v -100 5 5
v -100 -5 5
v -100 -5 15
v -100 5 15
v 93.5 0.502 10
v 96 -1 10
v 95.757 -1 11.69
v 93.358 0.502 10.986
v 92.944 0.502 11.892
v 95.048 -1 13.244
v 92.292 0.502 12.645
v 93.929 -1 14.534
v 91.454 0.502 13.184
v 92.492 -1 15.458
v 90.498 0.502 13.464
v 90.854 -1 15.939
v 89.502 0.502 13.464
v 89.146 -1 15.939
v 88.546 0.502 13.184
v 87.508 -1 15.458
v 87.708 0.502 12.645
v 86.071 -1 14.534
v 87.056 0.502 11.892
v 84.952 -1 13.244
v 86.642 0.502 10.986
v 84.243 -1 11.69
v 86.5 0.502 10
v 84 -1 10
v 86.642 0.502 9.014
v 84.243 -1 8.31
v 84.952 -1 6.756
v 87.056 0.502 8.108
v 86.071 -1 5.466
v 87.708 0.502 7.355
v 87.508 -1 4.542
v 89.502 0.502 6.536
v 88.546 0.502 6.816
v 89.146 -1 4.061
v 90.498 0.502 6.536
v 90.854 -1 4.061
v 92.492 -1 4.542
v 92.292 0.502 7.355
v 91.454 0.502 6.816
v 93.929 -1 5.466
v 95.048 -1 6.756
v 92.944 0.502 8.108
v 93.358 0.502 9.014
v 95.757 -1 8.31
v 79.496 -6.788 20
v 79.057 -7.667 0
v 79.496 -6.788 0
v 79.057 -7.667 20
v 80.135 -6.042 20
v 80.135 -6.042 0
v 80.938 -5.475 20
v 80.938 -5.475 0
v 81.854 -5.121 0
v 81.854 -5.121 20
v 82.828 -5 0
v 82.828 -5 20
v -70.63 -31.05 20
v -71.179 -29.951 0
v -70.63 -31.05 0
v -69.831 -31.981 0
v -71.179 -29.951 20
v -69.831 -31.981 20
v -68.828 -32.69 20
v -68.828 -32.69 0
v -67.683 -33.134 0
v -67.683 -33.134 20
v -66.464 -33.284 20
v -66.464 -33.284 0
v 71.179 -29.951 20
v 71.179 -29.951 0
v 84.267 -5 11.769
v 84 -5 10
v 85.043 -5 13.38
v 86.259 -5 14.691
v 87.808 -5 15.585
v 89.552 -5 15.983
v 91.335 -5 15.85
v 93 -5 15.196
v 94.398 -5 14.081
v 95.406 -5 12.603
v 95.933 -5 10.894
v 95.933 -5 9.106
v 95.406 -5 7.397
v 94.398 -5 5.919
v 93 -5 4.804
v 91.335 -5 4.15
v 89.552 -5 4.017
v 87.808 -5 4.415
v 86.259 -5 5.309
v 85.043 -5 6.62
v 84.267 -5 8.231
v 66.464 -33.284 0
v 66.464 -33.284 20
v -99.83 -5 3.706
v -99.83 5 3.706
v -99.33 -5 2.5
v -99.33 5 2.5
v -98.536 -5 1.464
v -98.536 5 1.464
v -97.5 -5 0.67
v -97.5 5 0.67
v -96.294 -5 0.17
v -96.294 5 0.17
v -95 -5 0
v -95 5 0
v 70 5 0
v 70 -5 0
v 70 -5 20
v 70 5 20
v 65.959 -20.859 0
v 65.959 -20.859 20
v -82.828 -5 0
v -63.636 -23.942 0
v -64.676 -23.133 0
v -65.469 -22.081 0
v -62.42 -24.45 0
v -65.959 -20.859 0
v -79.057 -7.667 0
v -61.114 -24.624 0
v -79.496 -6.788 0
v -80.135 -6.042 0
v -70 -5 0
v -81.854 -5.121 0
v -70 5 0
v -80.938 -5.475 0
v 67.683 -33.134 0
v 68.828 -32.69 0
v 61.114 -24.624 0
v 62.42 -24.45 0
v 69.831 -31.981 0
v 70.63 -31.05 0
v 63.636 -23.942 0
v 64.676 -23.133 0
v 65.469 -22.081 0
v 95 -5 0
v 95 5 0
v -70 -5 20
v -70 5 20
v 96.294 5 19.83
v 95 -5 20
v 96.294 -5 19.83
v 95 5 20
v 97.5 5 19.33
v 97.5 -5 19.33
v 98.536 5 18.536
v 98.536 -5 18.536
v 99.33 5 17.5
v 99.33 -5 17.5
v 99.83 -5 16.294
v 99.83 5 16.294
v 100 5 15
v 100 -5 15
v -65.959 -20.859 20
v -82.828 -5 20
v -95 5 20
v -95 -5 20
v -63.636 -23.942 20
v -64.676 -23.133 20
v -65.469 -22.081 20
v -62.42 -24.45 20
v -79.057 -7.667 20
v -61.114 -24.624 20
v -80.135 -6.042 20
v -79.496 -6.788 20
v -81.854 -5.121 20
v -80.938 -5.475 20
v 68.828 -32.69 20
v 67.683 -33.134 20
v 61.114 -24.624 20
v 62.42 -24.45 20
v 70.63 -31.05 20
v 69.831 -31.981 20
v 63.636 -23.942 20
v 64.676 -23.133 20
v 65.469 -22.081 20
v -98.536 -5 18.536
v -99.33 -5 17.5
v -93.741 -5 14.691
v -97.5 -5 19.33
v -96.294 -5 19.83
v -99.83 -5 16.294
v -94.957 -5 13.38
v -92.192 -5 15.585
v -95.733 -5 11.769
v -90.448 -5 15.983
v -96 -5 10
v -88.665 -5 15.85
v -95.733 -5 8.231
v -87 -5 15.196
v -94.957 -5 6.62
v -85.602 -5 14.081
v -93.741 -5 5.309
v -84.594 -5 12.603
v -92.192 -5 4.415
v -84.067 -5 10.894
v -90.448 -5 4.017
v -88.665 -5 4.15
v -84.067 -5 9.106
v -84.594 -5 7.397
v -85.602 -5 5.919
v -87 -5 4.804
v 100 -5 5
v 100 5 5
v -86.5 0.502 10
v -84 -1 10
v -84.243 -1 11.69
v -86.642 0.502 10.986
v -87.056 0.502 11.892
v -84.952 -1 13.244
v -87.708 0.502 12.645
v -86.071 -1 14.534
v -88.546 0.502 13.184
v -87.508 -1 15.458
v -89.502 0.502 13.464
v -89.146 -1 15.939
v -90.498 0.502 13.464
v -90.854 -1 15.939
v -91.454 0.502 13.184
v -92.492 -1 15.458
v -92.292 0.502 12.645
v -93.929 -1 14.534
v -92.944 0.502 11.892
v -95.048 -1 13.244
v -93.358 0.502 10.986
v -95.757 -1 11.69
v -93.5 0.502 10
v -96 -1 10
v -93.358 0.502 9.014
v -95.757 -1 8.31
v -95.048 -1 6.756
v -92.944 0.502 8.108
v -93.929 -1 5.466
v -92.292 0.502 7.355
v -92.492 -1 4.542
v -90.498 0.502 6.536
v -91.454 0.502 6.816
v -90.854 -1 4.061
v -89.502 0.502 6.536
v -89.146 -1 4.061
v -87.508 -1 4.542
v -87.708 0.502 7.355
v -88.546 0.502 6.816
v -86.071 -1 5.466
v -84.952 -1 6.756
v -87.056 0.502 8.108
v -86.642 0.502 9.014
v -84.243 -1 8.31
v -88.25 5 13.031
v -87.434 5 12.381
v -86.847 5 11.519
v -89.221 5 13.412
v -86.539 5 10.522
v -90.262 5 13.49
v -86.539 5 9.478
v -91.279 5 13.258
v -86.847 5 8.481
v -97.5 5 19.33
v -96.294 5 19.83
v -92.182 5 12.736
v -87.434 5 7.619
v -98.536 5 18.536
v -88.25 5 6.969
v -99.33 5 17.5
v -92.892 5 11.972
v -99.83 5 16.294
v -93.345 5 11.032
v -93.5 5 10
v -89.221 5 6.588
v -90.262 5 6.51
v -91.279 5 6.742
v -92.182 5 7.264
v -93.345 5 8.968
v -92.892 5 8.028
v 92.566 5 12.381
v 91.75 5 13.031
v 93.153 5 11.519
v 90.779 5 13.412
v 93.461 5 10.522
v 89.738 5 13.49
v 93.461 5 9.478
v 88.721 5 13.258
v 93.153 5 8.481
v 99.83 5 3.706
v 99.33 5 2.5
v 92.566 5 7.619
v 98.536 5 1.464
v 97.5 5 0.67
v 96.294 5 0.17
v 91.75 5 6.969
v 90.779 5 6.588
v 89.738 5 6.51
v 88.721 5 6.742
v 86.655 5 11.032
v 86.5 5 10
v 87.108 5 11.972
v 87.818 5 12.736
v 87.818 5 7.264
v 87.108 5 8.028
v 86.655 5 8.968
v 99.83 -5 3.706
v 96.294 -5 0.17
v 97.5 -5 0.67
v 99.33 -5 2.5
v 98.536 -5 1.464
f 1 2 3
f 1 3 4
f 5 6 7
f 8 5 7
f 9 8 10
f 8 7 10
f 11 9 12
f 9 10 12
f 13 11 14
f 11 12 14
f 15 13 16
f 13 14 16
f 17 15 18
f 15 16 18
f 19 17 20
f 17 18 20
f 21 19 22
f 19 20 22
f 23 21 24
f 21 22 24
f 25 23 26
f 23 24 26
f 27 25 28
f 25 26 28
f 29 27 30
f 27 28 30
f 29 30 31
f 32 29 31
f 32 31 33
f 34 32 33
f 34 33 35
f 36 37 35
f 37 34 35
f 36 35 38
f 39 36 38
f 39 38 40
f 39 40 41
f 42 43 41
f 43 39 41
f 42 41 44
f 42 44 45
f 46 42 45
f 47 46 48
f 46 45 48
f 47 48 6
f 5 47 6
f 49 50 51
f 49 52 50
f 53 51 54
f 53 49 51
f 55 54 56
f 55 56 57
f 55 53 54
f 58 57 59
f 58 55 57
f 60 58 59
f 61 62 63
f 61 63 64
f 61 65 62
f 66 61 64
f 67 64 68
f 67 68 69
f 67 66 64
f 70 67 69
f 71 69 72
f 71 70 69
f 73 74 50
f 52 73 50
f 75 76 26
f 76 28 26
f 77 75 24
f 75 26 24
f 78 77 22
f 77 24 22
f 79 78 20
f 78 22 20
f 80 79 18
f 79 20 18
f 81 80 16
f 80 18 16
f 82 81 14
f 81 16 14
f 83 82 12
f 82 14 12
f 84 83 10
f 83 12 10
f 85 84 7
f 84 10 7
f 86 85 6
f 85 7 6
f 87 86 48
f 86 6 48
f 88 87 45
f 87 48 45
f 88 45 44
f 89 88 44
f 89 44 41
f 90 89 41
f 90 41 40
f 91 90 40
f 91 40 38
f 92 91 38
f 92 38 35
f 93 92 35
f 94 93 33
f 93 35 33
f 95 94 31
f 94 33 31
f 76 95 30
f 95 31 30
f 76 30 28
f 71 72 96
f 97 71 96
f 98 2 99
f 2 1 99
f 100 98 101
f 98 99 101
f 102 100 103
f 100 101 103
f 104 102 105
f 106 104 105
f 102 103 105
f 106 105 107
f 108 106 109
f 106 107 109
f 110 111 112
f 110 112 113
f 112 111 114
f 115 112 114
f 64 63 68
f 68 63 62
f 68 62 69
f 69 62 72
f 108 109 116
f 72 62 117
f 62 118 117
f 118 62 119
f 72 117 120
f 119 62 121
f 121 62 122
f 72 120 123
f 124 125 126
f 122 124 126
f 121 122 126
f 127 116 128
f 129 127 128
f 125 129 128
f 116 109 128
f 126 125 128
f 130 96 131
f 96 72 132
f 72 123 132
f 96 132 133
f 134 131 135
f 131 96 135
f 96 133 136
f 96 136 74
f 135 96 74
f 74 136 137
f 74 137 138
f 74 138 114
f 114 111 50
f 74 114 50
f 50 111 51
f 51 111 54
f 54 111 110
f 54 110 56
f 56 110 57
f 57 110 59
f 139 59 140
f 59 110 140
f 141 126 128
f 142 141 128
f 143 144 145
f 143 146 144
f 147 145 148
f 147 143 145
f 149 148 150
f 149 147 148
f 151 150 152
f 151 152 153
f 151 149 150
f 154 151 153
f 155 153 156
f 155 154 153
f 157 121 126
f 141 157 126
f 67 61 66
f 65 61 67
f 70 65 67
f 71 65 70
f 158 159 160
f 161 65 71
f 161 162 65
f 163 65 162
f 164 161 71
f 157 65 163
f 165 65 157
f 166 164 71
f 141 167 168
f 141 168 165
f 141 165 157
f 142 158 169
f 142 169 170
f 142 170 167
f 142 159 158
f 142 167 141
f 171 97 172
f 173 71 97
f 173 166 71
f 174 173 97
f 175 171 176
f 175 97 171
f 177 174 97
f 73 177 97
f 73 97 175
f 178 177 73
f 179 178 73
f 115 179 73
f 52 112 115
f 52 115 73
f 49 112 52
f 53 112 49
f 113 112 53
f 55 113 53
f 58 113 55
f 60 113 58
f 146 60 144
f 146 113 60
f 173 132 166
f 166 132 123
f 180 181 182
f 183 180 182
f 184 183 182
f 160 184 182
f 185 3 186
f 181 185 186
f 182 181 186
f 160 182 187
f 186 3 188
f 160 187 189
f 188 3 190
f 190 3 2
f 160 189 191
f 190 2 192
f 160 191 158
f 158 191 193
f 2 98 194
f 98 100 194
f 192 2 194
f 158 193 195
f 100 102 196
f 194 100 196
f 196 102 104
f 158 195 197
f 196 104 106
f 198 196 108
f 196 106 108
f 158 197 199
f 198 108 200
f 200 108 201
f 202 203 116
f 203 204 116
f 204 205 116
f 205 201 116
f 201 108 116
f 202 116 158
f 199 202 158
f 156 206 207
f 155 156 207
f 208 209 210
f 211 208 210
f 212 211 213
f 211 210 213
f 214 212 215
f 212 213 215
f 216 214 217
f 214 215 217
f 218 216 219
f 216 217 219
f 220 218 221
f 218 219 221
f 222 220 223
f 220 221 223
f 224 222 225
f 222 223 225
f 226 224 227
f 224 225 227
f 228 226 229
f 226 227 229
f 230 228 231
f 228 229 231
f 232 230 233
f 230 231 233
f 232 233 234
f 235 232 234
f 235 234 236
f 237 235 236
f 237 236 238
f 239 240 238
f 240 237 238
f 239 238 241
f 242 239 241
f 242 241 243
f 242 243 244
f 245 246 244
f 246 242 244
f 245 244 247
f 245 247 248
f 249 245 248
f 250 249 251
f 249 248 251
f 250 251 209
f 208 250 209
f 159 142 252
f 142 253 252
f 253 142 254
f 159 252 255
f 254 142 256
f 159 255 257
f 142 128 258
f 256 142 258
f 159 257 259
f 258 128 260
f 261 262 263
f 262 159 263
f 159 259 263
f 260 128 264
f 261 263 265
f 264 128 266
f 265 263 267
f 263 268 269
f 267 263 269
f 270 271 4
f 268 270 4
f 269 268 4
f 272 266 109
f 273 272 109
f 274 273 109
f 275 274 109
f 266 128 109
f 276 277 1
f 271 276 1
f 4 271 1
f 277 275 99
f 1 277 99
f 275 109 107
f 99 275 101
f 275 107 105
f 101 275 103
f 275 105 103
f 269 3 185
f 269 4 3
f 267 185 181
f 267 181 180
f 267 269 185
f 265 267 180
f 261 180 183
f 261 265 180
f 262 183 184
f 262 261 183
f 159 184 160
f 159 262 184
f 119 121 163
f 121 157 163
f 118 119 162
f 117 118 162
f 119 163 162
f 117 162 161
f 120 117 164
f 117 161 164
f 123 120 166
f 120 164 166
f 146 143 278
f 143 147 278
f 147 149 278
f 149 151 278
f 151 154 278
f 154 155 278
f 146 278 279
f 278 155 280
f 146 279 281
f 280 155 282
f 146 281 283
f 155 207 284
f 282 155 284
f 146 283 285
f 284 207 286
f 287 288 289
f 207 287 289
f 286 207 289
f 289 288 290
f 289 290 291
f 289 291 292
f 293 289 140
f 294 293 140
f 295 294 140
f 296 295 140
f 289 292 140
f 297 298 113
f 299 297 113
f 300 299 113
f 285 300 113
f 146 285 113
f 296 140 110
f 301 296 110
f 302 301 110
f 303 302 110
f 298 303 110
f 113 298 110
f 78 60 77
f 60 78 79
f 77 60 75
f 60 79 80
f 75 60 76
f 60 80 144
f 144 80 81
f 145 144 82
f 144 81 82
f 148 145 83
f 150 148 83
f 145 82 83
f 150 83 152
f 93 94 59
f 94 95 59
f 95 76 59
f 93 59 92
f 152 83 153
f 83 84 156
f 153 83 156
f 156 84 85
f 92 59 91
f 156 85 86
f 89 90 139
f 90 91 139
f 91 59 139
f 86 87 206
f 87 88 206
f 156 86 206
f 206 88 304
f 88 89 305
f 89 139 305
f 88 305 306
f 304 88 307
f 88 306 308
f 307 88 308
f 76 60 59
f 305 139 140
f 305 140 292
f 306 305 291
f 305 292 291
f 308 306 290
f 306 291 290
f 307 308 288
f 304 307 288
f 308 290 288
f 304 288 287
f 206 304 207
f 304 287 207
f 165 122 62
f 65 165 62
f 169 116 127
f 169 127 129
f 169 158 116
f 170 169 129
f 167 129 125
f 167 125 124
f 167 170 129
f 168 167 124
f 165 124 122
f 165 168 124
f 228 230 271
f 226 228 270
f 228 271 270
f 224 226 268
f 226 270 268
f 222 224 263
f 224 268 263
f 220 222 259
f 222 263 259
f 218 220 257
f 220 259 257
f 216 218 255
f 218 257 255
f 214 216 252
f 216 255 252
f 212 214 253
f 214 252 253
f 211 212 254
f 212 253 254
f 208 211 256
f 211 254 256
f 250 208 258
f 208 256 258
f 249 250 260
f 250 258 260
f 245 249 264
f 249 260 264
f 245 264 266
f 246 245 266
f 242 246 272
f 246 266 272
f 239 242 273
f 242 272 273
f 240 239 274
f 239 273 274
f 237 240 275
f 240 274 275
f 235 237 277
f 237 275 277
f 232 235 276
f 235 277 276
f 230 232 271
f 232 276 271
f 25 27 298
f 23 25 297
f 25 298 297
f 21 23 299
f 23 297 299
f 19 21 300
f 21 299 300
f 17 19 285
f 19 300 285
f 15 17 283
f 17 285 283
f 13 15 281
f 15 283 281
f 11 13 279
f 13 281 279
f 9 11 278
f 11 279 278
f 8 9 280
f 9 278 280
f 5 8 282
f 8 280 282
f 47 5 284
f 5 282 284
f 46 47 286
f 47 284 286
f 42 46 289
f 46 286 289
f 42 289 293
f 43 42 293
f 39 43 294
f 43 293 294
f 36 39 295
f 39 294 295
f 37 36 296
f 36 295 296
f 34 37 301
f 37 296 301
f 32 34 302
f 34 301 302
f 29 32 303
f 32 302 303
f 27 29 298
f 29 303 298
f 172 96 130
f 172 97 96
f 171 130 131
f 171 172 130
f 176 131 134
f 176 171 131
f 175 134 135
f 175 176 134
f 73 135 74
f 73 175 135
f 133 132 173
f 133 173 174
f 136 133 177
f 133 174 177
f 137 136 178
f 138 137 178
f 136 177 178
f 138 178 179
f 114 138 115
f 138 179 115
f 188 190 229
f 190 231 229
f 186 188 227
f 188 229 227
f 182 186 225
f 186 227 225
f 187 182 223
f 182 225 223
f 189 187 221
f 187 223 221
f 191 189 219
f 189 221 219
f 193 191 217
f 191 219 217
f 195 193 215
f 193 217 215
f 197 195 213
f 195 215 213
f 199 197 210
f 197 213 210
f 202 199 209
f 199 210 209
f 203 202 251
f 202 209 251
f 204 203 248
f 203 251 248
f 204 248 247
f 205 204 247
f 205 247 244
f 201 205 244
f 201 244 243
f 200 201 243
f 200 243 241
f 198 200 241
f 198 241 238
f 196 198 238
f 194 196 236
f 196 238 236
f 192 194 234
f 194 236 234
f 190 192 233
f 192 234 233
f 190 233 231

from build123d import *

# Parameters (mm, degrees)
F0_W     = 20
F0_H     = 10
F0_W_2   = 10
F1_DEPTH = 20
F3_D     = 7
F4_D     = 12
F4_DEPTH = 4
F4_TIP   = 3.6051637142
F5_R     = 5
F6_R     = 4
F7_R     = 5


with BuildPart() as f1:
    # F0 (on Top) → F1 (new body)
    with BuildSketch(Plane.XY):
        with Locations((-90, 0)):
            Rectangle(F0_W, F0_H)
        Polygon((-70, -5), (-80, -5), (-70, -33.2842712475), (70, -33.2842712475), (80, -5), (70, -5), (65, -24.6240172096), (-65, -24.6240172096), align=None)
        with Locations((-75, 0)):
            Rectangle(F0_W_2, F0_H)
        with Locations((75, 0)):
            Rectangle(F0_W_2, F0_H)
        with Locations((90, 0)):
            Rectangle(F0_W, F0_H)
    extrude(amount=F1_DEPTH)

    # F3 (through all)
    with Locations(Plane.XZ.offset(5)):
        with Locations((-90, 10), (90, 10)):
            Hole(F3_D / 2)

    # F4
    with Locations(Plane.XZ.offset(5)):
        with Locations((-90, 10), (90, 10)):
            Hole(F4_D / 2, depth=F4_DEPTH)
            with Locations((0, 0, -(F4_DEPTH + F4_TIP / 2))):  # 118° drill point
                Cone(0, F4_D / 2, F4_TIP, mode=Mode.SUBTRACT)

    # F5
    f5_edges = [f1.edges().sort_by_distance(p)[0] for p in [
        (-100, 0, 20),
        (-100, 0, 0),
        (100, 0, 20),
        (100, 0, 0),
    ]]
    fillet(f5_edges, radius=F5_R)

    # F6
    f6_edges = [f1.edges().sort_by_distance(p)[0] for p in [
        (-80, -5, 10),
        (80, -5, 10),
    ]]
    fillet(f6_edges, radius=F6_R)

    # F7
    f7_edges = [f1.edges().sort_by_distance(p)[0] for p in [
        (-70, -33.284271, 10),
        (70, -33.284271, 10),
        (-65, -24.624017, 10),
        (65, -24.624017, 10),
    ]]
    fillet(f7_edges, radius=F7_R)


solid = f1.part
